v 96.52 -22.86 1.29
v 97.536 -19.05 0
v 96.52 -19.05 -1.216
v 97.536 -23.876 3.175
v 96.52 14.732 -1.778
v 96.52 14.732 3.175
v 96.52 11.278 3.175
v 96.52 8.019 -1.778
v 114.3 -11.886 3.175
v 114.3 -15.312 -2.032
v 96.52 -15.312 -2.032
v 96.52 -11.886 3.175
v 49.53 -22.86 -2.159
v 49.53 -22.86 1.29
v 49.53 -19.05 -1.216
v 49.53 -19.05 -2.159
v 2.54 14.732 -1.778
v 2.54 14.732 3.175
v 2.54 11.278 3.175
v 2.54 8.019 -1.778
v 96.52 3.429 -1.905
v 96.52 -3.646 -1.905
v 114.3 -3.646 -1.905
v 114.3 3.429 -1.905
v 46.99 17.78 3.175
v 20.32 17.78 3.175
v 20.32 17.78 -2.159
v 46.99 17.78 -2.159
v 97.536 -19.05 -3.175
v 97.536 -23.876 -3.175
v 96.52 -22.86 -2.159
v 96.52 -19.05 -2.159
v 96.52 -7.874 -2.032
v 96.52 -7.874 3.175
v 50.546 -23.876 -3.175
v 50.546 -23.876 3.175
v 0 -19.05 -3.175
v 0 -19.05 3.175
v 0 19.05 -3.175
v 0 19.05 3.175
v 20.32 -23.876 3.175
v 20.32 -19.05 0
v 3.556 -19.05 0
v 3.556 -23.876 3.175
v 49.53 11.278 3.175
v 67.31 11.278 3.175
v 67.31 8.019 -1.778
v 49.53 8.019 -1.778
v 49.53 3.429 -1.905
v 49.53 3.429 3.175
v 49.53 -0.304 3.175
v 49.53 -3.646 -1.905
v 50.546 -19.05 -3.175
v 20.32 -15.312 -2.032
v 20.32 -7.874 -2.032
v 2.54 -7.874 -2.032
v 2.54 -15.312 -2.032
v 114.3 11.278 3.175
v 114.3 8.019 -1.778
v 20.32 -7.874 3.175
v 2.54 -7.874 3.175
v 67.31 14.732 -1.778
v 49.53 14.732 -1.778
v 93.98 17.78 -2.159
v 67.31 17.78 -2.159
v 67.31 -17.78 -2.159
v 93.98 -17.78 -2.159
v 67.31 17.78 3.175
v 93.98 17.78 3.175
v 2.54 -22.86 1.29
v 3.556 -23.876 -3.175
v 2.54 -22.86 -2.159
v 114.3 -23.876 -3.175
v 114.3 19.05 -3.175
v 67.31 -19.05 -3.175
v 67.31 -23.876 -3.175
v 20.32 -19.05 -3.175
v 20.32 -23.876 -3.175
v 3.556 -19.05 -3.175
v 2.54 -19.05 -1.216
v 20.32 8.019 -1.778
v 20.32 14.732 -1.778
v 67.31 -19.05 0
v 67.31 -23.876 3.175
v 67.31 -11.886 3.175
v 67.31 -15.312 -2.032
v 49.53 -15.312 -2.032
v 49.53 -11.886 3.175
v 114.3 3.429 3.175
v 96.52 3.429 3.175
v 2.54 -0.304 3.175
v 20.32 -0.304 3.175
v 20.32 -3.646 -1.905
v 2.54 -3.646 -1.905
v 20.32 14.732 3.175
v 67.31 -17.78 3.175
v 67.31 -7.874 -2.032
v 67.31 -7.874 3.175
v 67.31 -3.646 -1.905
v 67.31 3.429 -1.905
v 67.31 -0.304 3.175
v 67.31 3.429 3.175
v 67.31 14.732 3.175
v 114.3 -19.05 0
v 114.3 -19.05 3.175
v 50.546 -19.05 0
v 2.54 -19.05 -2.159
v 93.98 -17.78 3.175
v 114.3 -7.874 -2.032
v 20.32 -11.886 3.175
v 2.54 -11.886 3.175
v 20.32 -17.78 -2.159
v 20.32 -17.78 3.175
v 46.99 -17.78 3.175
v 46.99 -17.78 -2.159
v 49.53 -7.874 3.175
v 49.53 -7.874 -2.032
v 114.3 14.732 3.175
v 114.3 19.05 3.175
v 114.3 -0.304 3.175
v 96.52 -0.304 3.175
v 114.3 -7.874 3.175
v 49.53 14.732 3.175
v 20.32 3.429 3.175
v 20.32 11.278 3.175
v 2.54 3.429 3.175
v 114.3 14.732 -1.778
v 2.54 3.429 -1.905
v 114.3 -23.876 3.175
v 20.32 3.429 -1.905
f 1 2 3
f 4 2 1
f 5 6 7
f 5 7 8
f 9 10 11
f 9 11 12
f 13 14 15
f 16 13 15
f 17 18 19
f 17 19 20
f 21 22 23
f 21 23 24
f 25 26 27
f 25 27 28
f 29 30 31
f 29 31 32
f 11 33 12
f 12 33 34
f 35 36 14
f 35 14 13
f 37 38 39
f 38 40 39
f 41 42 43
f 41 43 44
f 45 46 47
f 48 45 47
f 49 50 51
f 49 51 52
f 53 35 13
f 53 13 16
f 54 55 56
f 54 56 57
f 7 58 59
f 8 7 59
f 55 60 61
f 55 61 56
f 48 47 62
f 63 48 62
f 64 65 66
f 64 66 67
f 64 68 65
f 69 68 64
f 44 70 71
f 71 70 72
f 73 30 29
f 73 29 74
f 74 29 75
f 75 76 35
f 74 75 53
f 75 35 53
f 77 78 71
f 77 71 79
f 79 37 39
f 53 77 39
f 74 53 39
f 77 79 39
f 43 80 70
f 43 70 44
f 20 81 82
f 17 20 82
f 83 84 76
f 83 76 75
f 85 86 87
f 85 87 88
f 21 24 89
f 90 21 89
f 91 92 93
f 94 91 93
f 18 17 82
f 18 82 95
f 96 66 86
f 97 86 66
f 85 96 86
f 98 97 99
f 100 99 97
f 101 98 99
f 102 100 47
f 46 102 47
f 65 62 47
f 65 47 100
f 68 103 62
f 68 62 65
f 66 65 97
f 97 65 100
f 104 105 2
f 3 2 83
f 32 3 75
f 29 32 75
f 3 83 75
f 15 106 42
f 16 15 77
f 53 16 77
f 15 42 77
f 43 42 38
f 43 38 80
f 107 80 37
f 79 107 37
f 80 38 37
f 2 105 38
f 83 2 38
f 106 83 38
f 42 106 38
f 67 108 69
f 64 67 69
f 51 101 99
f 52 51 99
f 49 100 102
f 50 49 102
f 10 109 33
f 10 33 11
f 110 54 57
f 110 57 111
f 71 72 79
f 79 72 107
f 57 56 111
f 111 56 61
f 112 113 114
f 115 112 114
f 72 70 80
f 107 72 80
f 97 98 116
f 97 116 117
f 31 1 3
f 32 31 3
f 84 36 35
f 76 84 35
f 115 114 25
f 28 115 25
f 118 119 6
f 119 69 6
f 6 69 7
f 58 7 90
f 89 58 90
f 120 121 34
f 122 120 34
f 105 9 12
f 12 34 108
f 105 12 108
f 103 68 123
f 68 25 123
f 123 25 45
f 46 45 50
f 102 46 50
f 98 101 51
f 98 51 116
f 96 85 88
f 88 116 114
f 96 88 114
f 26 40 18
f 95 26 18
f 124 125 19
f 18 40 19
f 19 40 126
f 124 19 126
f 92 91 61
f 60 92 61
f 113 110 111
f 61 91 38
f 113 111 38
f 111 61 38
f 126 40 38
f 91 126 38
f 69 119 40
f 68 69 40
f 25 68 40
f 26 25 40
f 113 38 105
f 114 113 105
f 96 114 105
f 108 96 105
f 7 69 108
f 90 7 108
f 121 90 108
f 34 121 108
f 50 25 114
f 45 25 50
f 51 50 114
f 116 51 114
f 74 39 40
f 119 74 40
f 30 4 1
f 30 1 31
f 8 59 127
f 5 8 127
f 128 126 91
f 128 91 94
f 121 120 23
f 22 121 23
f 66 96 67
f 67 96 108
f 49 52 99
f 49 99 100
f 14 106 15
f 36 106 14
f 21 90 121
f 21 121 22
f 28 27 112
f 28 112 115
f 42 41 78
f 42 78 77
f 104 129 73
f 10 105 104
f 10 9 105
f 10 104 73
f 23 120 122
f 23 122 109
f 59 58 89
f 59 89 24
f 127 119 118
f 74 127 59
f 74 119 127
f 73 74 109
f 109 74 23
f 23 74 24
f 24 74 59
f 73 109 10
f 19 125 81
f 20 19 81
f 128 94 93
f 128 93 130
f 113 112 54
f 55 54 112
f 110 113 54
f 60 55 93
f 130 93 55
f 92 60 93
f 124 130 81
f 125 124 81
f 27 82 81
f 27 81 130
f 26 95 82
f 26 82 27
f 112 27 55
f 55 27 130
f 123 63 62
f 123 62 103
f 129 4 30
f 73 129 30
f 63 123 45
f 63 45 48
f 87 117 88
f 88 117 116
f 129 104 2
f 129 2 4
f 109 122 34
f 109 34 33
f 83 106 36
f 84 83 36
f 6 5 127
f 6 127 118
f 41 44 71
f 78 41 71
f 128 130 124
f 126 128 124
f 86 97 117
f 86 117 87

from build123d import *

# Parameters (mm, degrees)
BOSS_EXTRUDE1_DEPTH = 114.3
CUT_EXTRUDE2_DEPTH  = 17.78
LPATTERN2_COUNT     = 3
LPATTERN2_PITCH     = 46.99
SKETCH5_W           = 26.67
SKETCH5_H           = 35.56
CUT_EXTRUDE3_DEPTH  = 5.334
SKETCH6_W           = 2.54
SKETCH6_H           = 4.826
SKETCH6_W_2         = 29.21
CUT_EXTRUDE4_DEPTH  = 7.35
CHAMFER1_SIZE       = 1.016


with BuildPart() as part:
    # Sketch2 → Boss-Extrude1 (new body)
    with BuildSketch(Plane(origin=(0, 0, 0), x_dir=(0, 0, -1), z_dir=(1, 0, 0))):
        Polygon((0, -19.05), (-3.175, -23.876), (3.175, -23.876), (3.175, -19.05), (3.175, 19.05), (-3.175, 19.05), (-3.175, -19.05), align=None)
    extrude(amount=BOSS_EXTRUDE1_DEPTH)

    # Sketch4 → Cut-Extrude2 (cut)
    with BuildSketch(Plane(origin=(114.3, 0, 0), x_dir=(0, 0, -1), z_dir=(1, 0, 0))):
        Polygon((-3.175, 14.732), (-3.175, 11.277980125), (1.778, 8.019427494), (1.778, 14.732), align=None)
        Polygon((-3.175, 3.429), (-3.175, -0.304039749), (1.905, -3.646145012), (1.905, 3.429), align=None)
        Polygon((-3.175, -7.874), (2.032, -7.874), (2.032, -15.311717518), (-3.175, -11.886059624), align=None)
    cut_extrude2 = extrude(amount=-CUT_EXTRUDE2_DEPTH, mode=Mode.SUBTRACT)

    # LPattern2: Cut-Extrude2 ×3
    with Locations(*[(-i * LPATTERN2_PITCH, 0, 0) for i in range(1, LPATTERN2_COUNT)]):
        add(cut_extrude2, mode=Mode.SUBTRACT)

    # Sketch5 → Cut-Extrude3 (cut)
    with BuildSketch(Plane.XY.offset(3.175)):
        with Locations((80.645, 0)):
            Rectangle(SKETCH5_W, SKETCH5_H)
        with Locations((33.655, 0)):
            Rectangle(SKETCH5_W, SKETCH5_H)
    extrude(amount=-CUT_EXTRUDE3_DEPTH, mode=Mode.SUBTRACT)

    # Sketch6 → Cut-Extrude4 (cut, through all)
    with BuildSketch(Plane.XY.offset(3.175)):
        with Locations((1.27, -21.463)):
            Rectangle(SKETCH6_W, SKETCH6_H)
        with Locations((34.925, -21.463)):
            Rectangle(SKETCH6_W_2, SKETCH6_H)
        with Locations((81.915, -21.463)):
            Rectangle(SKETCH6_W_2, SKETCH6_H)
    extrude(amount=-CUT_EXTRUDE4_DEPTH, mode=Mode.SUBTRACT)

    # Chamfer1
    chamfer1_edges = [part.edges().sort_by_distance(p)[0] for p in [
        (2.54, -21.463, 1.5875),
        (2.54, -21.463, -3.175),
        (2.54, -23.876, 0),
        (49.53, -21.463, 1.5875),
        (49.53, -21.463, -3.175),
        (49.53, -23.876, 0),
        (96.52, -21.463, 1.5875),
        (96.52, -21.463, -3.175),
        (96.52, -23.876, 0),
    ]]
    chamfer(chamfer1_edges, length=CHAMFER1_SIZE)


solid = part.part
